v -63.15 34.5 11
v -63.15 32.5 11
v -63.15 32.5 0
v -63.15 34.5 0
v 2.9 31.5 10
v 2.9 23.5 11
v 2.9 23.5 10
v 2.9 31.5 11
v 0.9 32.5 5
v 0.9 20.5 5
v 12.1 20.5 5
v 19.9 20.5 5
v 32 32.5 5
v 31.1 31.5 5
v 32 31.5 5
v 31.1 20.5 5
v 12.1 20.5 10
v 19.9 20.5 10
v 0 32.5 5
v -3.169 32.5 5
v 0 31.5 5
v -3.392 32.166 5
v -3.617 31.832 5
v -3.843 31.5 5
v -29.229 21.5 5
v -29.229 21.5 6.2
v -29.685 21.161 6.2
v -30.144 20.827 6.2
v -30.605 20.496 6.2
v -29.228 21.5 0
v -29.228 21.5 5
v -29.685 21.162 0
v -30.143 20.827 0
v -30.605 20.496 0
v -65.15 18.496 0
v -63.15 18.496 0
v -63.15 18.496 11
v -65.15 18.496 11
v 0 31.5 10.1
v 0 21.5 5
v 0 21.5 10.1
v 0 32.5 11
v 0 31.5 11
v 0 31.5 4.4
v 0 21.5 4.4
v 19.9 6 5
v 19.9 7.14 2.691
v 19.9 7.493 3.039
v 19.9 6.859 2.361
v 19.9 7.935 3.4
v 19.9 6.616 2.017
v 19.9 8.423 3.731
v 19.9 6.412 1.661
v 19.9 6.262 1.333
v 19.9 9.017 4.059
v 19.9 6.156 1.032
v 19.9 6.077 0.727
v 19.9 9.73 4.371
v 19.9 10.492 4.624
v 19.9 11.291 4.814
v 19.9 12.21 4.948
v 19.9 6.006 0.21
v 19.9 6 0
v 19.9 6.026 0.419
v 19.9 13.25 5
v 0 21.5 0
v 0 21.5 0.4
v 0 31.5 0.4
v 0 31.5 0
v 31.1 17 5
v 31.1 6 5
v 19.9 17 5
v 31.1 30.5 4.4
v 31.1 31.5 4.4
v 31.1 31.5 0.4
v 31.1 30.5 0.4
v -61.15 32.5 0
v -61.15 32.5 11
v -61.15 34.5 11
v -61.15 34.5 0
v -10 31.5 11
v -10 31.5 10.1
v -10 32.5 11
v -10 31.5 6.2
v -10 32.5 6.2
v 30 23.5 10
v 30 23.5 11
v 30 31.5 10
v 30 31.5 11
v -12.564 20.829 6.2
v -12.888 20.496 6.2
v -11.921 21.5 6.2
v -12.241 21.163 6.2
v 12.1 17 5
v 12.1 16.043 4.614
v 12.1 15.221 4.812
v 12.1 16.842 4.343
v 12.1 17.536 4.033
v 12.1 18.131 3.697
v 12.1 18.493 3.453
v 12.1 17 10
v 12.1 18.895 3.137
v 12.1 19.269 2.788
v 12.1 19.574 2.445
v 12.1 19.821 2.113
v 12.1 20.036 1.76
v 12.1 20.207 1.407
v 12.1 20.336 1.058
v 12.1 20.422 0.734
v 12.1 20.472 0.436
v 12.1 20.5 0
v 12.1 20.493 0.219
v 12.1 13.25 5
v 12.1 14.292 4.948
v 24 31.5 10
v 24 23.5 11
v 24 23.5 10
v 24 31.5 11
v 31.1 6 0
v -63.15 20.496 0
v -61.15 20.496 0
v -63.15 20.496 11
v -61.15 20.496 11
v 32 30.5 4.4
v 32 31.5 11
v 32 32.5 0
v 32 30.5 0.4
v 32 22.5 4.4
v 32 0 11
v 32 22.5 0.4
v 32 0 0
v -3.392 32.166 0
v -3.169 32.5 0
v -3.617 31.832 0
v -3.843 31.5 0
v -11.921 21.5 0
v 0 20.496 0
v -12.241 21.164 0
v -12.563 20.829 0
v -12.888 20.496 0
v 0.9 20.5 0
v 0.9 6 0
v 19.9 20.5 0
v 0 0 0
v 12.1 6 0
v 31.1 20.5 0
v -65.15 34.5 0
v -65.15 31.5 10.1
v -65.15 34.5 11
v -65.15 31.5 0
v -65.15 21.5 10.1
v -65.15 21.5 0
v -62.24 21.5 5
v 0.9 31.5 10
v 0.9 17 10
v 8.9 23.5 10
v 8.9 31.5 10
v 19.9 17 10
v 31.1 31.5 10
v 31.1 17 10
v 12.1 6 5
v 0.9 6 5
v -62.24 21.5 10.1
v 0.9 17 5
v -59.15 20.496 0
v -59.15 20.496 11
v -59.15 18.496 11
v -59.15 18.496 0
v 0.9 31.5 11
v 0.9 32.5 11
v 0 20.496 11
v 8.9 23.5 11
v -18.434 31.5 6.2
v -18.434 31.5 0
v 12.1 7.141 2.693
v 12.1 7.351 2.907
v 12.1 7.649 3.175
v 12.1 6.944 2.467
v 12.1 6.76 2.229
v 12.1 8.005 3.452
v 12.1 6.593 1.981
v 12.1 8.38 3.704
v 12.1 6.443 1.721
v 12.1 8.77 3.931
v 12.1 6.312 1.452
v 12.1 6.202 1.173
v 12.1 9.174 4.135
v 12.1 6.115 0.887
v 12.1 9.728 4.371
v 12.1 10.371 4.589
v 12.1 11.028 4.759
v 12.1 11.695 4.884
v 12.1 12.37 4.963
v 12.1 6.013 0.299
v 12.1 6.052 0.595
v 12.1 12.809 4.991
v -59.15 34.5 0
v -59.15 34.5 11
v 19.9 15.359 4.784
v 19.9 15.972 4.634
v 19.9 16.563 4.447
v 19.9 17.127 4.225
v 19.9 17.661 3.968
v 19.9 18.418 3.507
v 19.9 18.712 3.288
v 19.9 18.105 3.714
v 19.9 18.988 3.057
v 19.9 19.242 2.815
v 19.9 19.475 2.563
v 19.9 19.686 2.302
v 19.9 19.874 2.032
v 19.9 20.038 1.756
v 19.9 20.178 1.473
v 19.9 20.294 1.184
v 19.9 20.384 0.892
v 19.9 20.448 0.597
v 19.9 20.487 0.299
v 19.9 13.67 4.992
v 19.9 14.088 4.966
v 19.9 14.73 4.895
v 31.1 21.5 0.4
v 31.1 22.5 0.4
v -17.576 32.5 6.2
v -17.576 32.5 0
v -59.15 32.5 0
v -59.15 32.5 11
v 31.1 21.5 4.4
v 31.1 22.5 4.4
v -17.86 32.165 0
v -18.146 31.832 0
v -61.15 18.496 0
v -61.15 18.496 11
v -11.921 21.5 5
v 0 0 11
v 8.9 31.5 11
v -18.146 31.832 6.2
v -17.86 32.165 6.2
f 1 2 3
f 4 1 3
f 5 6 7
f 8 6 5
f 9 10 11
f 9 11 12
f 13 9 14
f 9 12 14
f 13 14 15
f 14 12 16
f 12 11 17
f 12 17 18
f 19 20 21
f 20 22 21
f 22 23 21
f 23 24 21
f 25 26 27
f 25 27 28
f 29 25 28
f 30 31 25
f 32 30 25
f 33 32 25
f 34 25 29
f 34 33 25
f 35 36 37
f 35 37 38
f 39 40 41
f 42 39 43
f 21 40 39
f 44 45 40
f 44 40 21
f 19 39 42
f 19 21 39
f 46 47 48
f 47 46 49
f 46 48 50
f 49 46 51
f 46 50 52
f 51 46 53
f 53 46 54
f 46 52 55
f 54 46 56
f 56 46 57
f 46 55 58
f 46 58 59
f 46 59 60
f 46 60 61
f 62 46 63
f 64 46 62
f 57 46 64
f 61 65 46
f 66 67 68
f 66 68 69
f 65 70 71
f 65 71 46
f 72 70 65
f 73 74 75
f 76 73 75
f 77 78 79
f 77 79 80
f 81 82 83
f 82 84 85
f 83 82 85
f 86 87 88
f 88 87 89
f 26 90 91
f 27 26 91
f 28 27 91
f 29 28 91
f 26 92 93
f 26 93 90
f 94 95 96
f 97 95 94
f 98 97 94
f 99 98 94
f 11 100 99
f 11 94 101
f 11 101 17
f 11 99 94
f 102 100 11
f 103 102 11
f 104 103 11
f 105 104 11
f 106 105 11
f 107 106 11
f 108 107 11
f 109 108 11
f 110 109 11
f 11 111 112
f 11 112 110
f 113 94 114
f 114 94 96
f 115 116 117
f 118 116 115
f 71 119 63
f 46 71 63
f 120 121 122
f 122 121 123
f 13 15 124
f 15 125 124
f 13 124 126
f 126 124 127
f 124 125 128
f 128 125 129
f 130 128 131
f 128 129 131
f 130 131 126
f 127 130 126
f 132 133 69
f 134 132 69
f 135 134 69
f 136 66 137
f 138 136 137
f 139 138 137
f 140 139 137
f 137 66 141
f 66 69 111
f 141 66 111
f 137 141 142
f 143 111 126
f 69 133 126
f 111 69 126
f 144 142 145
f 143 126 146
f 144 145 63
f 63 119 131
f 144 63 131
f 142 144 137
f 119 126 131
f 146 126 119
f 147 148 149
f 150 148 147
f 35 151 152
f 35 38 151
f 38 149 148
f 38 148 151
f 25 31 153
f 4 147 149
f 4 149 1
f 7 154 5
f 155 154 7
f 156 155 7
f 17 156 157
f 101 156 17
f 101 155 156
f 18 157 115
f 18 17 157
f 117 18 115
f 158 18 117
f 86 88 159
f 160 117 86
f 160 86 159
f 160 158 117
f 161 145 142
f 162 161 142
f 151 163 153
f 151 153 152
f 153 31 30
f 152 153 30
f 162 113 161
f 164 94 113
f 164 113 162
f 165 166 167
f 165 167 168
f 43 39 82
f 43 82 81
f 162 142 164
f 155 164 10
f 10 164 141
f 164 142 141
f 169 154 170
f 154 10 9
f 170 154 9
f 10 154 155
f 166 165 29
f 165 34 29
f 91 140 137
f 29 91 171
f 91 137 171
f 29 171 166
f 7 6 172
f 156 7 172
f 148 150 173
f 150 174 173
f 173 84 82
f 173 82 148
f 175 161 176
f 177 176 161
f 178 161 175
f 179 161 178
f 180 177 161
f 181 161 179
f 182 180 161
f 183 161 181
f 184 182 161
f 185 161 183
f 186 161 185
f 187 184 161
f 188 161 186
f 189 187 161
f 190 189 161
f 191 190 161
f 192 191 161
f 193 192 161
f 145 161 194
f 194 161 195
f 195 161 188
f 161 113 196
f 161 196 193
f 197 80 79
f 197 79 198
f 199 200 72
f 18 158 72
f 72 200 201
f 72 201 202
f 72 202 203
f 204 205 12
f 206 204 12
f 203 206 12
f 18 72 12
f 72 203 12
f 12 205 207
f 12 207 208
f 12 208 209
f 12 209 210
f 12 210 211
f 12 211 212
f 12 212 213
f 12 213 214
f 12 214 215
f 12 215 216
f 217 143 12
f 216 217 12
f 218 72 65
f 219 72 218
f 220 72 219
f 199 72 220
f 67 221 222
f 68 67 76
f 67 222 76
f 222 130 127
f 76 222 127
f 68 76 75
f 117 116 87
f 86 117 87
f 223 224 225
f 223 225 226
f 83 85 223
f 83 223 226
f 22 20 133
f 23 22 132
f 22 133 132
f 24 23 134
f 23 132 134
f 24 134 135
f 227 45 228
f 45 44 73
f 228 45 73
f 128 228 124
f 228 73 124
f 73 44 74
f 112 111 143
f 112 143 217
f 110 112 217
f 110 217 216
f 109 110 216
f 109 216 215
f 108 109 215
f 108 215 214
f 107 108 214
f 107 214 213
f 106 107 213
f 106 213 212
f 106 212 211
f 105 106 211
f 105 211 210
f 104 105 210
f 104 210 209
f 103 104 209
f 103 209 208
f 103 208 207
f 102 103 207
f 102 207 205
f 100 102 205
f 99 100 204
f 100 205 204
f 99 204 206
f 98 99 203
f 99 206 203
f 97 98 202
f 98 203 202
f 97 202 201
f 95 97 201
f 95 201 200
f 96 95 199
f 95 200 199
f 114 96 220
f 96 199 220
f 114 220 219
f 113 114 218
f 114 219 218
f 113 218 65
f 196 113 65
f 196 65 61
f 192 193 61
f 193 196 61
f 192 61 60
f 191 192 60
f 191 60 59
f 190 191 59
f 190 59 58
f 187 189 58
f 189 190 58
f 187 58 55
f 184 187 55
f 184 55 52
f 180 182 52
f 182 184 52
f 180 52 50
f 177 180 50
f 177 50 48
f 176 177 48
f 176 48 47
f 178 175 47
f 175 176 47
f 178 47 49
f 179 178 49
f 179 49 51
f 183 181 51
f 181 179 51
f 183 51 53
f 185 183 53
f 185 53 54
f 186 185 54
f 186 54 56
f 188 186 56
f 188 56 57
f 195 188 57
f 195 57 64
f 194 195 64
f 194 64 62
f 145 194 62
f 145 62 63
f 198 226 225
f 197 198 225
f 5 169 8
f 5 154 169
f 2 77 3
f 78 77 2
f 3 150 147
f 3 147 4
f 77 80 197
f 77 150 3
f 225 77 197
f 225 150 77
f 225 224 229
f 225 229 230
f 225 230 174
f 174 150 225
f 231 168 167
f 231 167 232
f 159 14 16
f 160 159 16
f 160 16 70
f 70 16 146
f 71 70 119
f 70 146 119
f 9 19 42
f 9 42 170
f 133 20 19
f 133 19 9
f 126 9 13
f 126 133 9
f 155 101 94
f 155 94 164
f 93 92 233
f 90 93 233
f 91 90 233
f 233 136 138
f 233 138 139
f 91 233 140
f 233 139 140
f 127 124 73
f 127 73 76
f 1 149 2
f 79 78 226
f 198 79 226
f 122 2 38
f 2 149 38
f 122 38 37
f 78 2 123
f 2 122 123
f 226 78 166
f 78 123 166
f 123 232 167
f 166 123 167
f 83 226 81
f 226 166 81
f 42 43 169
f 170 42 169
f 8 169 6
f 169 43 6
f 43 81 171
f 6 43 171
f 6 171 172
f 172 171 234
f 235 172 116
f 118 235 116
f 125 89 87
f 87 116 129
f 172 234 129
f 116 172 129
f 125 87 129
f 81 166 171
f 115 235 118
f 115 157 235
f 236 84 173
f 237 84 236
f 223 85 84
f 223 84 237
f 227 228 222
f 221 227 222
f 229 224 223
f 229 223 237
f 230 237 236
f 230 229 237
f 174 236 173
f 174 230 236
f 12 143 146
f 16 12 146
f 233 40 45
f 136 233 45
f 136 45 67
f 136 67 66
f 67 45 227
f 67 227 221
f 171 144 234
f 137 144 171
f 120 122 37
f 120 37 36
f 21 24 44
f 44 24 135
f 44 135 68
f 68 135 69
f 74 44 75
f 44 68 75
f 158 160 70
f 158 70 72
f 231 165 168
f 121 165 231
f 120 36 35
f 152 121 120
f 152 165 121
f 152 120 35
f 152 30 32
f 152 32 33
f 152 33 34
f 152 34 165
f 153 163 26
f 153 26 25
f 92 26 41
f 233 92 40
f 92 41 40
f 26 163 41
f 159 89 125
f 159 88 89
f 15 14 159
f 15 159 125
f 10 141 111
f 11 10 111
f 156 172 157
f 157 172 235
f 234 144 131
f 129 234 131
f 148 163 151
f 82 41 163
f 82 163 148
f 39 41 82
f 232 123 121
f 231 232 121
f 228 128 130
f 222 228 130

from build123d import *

# Parameters (mm, degrees)
BOSS_EXTRUDE2_DEPTH  = 11
BOSS_EXTRUDE3_DEPTH  = 5
SKETCH2_W            = 30.2
SKETCH2_H            = 1
BOSS_EXTRUDE4_DEPTH  = 25.5
SKETCH1_W            = 7.8
SKETCH1_H            = 14.5
BOSS_EXTRUDE5_DEPTH  = 11
SKETCH3_W            = 11.2
SKETCH3_H            = 11
BOSS_EXTRUDE6_DEPTH  = 5
SKETCH4_W            = 31.1
SKETCH4_H            = 4
CUT_EXTRUDE1_DEPTH   = 10
SKETCH5_W            = 32
SKETCH5_H            = 5
BOSS_EXTRUDE7_DEPTH  = 1
SKETCH7_W            = 5
SKETCH7_H            = 1
SKETCH7_H_2          = 1.003816478
BOSS_EXTRUDE8_DEPTH  = 62.24
SKETCH8_W            = 0.9
SKETCH8_H            = 1
BOSS_EXTRUDE9_DEPTH  = 6
BOSS_EXTRUDE10_DEPTH = 62.26
SKETCH10_W           = 52.24
SKETCH10_H           = 1
BOSS_EXTRUDE11_DEPTH = 6
SKETCH11_R           = 81.7
SKETCH11_R_2         = 70.15
CUT_EXTRUDE2_DEPTH   = 6.2
BOSS_EXTRUDE12_DEPTH = 2.91
SKETCH14_W           = 2
SKETCH14_H           = 11
BOSS_EXTRUDE13_DEPTH = 2
SKETCH15_W           = 2
SKETCH15_H           = 11
BOSS_EXTRUDE14_DEPTH = 2
SKETCH20_RX          = 7.25
SKETCH20_RY          = 5
CUT_EXTRUDE3_DEPTH   = 10
SKETCH21_W           = 6
SKETCH21_H           = 8
CUT_EXTRUDE4_DEPTH   = 1
SKETCH22_W           = 4
SKETCH22_H           = 8
CUT_EXTRUDE5_DEPTH   = 1


with BuildPart() as part:
    # Sketch1<3> → Boss-Extrude2 (new body)
    with BuildSketch(Plane.XY):
        Polygon((0, 31.5), (0, 0), (32, 0), (32, 31.5), (31.1, 31.5), (31.1, 6), (0.9, 6), (0.9, 31.5), align=None)
    extrude(amount=BOSS_EXTRUDE2_DEPTH)

    # Sketch1<4> → Boss-Extrude3 (add)
    with BuildSketch(Plane.XY):
        Polygon((0.9, 31.5), (0.9, 20.5), (12.1, 20.5), (19.9, 20.5), (31.1, 20.5), (31.1, 31.5), align=None)
    extrude(amount=BOSS_EXTRUDE3_DEPTH)

    # Sketch2 → Boss-Extrude4 (add)
    with BuildSketch(Plane(origin=(0, 6, 0), x_dir=(1, 0, 0), z_dir=(0, 1, 0))):
        with Locations((16, -10.5)):
            Rectangle(SKETCH2_W, SKETCH2_H)
    extrude(amount=BOSS_EXTRUDE4_DEPTH)

    # Sketch1 → Boss-Extrude5 (add)
    with BuildSketch(Plane.XY):
        with Locations((16, 13.25)):
            Rectangle(SKETCH1_W, SKETCH1_H)
    extrude(amount=BOSS_EXTRUDE5_DEPTH)

    # Sketch3 → Boss-Extrude6 (add)
    with BuildSketch(Plane(origin=(0, 0, 10), x_dir=(-1, 0, 0), z_dir=(0, 0, -1))):
        with Locations((-6.5, 11.5)):
            Rectangle(SKETCH3_W, SKETCH3_H)
        with Locations((-25.5, 11.5)):
            Rectangle(SKETCH3_W, SKETCH3_H)
    extrude(amount=BOSS_EXTRUDE6_DEPTH)

    # Sketch4 → Cut-Extrude1 (cut)
    with BuildSketch(Plane(origin=(0, 31.5, 0), x_dir=(1, 0, 0), z_dir=(0, 1, 0))):
        with Locations((15.55, -2.4)):
            Rectangle(SKETCH4_W, SKETCH4_H)
    extrude(amount=-CUT_EXTRUDE1_DEPTH, mode=Mode.SUBTRACT)

    # Sketch5 → Boss-Extrude7 (add)
    with BuildSketch(Plane(origin=(0, 31.5, 0), x_dir=(1, 0, 0), z_dir=(0, 1, 0))):
        with Locations((16, -2.5)):
            Rectangle(SKETCH5_W, SKETCH5_H)
    extrude(amount=BOSS_EXTRUDE7_DEPTH)

    # Sketch7 → Boss-Extrude8 (add)
    with BuildSketch(Plane.ZY):
        with Locations((2.5, 32)):
            Rectangle(SKETCH7_W, SKETCH7_H)
        with Locations((2.5, 20.998091761)):
            Rectangle(SKETCH7_W, SKETCH7_H_2)
    extrude(amount=BOSS_EXTRUDE8_DEPTH)

    # Sketch8 → Boss-Extrude9 (add)
    with BuildSketch(Plane.XY.offset(5)):
        with Locations((0.45, 32)):
            Rectangle(SKETCH8_W, SKETCH8_H)
    extrude(amount=BOSS_EXTRUDE9_DEPTH)

    # Sketch9 → Boss-Extrude10 (add)
    with BuildSketch(Plane.ZY):
        Polygon((11, 31.5), (10.1, 31.5), (10.1, 21.499511858), (5, 21.499511858), (5, 20.496183522), (11, 20.496183522), align=None)
    extrude(amount=BOSS_EXTRUDE10_DEPTH)

    # Sketch10 → Boss-Extrude11 (add)
    with BuildSketch(Plane.XY.offset(5)):
        with Locations((-36.12, 32)):
            Rectangle(SKETCH10_W, SKETCH10_H)
    extrude(amount=BOSS_EXTRUDE11_DEPTH)

    # Sketch11 → Cut-Extrude2 (cut)
    with BuildSketch(Plane(origin=(0, 0, 0), x_dir=(-1, 0, 0), z_dir=(0, 0, -1))):
        with Locations((71.241875, 77.677250508)):
            Circle(SKETCH11_R)
        with Locations((71.241875, 77.677250508)):
            Circle(SKETCH11_R_2, mode=Mode.SUBTRACT)
    extrude(amount=-CUT_EXTRUDE2_DEPTH, mode=Mode.SUBTRACT)

    # Sketch12 → Boss-Extrude12 (add)
    with BuildSketch(Plane.ZY.offset(62.24)):
        Polygon((11, 32.5), (0, 32.5), (0, 31.5), (10.1, 31.5), (10.1, 21.5), (0, 21.5), (0, 20.496183522), (11, 20.496183522), align=None)
    extrude(amount=BOSS_EXTRUDE12_DEPTH)

    # Sketch14 → Boss-Extrude13 (add)
    with BuildSketch(Plane(origin=(0, 20.496183522, 0), x_dir=(-1, 0, 0), z_dir=(0, -1, 0))):
        with Locations((64.15, -5.5)):
            Rectangle(SKETCH14_W, SKETCH14_H)
        with Locations((60.15, -5.5)):
            Rectangle(SKETCH14_W, SKETCH14_H)
    extrude(amount=BOSS_EXTRUDE13_DEPTH)

    # Sketch15 → Boss-Extrude14 (add)
    with BuildSketch(Plane(origin=(0, 32.5, 0), x_dir=(1, 0, 0), z_dir=(0, 1, 0))):
        with Locations((-64.15, -5.5)):
            Rectangle(SKETCH15_W, SKETCH15_H)
        with Locations((-60.15, -5.5)):
            Rectangle(SKETCH15_W, SKETCH15_H)
    extrude(amount=BOSS_EXTRUDE14_DEPTH)

    # Sketch20 → Cut-Extrude3 (cut)
    with BuildSketch(Plane(origin=(19.9, 0, 0), x_dir=(0, 0, -1), z_dir=(1, 0, 0))):
        with Locations(Location((0, 13.25), (0, 0, -90))):
            Ellipse(SKETCH20_RX, SKETCH20_RY)
    extrude(amount=-CUT_EXTRUDE3_DEPTH, mode=Mode.SUBTRACT)

    # Sketch21 → Cut-Extrude4 (cut)
    with BuildSketch(Plane.XY.offset(11)):
        with Locations((5.9, 27.5)):
            Rectangle(SKETCH21_W, SKETCH21_H)
        with Locations((27, 27.5)):
            Rectangle(SKETCH21_W, SKETCH21_H)
    extrude(amount=-CUT_EXTRUDE4_DEPTH, mode=Mode.SUBTRACT)

    # Sketch22 → Cut-Extrude5 (cut)
    with BuildSketch(Plane(origin=(32, 0, 0), x_dir=(0, 0, -1), z_dir=(1, 0, 0))):
        with Locations((-2.4, 26.5)):
            Rectangle(SKETCH22_W, SKETCH22_H)
    extrude(amount=-CUT_EXTRUDE5_DEPTH, mode=Mode.SUBTRACT)


solid = part.part
